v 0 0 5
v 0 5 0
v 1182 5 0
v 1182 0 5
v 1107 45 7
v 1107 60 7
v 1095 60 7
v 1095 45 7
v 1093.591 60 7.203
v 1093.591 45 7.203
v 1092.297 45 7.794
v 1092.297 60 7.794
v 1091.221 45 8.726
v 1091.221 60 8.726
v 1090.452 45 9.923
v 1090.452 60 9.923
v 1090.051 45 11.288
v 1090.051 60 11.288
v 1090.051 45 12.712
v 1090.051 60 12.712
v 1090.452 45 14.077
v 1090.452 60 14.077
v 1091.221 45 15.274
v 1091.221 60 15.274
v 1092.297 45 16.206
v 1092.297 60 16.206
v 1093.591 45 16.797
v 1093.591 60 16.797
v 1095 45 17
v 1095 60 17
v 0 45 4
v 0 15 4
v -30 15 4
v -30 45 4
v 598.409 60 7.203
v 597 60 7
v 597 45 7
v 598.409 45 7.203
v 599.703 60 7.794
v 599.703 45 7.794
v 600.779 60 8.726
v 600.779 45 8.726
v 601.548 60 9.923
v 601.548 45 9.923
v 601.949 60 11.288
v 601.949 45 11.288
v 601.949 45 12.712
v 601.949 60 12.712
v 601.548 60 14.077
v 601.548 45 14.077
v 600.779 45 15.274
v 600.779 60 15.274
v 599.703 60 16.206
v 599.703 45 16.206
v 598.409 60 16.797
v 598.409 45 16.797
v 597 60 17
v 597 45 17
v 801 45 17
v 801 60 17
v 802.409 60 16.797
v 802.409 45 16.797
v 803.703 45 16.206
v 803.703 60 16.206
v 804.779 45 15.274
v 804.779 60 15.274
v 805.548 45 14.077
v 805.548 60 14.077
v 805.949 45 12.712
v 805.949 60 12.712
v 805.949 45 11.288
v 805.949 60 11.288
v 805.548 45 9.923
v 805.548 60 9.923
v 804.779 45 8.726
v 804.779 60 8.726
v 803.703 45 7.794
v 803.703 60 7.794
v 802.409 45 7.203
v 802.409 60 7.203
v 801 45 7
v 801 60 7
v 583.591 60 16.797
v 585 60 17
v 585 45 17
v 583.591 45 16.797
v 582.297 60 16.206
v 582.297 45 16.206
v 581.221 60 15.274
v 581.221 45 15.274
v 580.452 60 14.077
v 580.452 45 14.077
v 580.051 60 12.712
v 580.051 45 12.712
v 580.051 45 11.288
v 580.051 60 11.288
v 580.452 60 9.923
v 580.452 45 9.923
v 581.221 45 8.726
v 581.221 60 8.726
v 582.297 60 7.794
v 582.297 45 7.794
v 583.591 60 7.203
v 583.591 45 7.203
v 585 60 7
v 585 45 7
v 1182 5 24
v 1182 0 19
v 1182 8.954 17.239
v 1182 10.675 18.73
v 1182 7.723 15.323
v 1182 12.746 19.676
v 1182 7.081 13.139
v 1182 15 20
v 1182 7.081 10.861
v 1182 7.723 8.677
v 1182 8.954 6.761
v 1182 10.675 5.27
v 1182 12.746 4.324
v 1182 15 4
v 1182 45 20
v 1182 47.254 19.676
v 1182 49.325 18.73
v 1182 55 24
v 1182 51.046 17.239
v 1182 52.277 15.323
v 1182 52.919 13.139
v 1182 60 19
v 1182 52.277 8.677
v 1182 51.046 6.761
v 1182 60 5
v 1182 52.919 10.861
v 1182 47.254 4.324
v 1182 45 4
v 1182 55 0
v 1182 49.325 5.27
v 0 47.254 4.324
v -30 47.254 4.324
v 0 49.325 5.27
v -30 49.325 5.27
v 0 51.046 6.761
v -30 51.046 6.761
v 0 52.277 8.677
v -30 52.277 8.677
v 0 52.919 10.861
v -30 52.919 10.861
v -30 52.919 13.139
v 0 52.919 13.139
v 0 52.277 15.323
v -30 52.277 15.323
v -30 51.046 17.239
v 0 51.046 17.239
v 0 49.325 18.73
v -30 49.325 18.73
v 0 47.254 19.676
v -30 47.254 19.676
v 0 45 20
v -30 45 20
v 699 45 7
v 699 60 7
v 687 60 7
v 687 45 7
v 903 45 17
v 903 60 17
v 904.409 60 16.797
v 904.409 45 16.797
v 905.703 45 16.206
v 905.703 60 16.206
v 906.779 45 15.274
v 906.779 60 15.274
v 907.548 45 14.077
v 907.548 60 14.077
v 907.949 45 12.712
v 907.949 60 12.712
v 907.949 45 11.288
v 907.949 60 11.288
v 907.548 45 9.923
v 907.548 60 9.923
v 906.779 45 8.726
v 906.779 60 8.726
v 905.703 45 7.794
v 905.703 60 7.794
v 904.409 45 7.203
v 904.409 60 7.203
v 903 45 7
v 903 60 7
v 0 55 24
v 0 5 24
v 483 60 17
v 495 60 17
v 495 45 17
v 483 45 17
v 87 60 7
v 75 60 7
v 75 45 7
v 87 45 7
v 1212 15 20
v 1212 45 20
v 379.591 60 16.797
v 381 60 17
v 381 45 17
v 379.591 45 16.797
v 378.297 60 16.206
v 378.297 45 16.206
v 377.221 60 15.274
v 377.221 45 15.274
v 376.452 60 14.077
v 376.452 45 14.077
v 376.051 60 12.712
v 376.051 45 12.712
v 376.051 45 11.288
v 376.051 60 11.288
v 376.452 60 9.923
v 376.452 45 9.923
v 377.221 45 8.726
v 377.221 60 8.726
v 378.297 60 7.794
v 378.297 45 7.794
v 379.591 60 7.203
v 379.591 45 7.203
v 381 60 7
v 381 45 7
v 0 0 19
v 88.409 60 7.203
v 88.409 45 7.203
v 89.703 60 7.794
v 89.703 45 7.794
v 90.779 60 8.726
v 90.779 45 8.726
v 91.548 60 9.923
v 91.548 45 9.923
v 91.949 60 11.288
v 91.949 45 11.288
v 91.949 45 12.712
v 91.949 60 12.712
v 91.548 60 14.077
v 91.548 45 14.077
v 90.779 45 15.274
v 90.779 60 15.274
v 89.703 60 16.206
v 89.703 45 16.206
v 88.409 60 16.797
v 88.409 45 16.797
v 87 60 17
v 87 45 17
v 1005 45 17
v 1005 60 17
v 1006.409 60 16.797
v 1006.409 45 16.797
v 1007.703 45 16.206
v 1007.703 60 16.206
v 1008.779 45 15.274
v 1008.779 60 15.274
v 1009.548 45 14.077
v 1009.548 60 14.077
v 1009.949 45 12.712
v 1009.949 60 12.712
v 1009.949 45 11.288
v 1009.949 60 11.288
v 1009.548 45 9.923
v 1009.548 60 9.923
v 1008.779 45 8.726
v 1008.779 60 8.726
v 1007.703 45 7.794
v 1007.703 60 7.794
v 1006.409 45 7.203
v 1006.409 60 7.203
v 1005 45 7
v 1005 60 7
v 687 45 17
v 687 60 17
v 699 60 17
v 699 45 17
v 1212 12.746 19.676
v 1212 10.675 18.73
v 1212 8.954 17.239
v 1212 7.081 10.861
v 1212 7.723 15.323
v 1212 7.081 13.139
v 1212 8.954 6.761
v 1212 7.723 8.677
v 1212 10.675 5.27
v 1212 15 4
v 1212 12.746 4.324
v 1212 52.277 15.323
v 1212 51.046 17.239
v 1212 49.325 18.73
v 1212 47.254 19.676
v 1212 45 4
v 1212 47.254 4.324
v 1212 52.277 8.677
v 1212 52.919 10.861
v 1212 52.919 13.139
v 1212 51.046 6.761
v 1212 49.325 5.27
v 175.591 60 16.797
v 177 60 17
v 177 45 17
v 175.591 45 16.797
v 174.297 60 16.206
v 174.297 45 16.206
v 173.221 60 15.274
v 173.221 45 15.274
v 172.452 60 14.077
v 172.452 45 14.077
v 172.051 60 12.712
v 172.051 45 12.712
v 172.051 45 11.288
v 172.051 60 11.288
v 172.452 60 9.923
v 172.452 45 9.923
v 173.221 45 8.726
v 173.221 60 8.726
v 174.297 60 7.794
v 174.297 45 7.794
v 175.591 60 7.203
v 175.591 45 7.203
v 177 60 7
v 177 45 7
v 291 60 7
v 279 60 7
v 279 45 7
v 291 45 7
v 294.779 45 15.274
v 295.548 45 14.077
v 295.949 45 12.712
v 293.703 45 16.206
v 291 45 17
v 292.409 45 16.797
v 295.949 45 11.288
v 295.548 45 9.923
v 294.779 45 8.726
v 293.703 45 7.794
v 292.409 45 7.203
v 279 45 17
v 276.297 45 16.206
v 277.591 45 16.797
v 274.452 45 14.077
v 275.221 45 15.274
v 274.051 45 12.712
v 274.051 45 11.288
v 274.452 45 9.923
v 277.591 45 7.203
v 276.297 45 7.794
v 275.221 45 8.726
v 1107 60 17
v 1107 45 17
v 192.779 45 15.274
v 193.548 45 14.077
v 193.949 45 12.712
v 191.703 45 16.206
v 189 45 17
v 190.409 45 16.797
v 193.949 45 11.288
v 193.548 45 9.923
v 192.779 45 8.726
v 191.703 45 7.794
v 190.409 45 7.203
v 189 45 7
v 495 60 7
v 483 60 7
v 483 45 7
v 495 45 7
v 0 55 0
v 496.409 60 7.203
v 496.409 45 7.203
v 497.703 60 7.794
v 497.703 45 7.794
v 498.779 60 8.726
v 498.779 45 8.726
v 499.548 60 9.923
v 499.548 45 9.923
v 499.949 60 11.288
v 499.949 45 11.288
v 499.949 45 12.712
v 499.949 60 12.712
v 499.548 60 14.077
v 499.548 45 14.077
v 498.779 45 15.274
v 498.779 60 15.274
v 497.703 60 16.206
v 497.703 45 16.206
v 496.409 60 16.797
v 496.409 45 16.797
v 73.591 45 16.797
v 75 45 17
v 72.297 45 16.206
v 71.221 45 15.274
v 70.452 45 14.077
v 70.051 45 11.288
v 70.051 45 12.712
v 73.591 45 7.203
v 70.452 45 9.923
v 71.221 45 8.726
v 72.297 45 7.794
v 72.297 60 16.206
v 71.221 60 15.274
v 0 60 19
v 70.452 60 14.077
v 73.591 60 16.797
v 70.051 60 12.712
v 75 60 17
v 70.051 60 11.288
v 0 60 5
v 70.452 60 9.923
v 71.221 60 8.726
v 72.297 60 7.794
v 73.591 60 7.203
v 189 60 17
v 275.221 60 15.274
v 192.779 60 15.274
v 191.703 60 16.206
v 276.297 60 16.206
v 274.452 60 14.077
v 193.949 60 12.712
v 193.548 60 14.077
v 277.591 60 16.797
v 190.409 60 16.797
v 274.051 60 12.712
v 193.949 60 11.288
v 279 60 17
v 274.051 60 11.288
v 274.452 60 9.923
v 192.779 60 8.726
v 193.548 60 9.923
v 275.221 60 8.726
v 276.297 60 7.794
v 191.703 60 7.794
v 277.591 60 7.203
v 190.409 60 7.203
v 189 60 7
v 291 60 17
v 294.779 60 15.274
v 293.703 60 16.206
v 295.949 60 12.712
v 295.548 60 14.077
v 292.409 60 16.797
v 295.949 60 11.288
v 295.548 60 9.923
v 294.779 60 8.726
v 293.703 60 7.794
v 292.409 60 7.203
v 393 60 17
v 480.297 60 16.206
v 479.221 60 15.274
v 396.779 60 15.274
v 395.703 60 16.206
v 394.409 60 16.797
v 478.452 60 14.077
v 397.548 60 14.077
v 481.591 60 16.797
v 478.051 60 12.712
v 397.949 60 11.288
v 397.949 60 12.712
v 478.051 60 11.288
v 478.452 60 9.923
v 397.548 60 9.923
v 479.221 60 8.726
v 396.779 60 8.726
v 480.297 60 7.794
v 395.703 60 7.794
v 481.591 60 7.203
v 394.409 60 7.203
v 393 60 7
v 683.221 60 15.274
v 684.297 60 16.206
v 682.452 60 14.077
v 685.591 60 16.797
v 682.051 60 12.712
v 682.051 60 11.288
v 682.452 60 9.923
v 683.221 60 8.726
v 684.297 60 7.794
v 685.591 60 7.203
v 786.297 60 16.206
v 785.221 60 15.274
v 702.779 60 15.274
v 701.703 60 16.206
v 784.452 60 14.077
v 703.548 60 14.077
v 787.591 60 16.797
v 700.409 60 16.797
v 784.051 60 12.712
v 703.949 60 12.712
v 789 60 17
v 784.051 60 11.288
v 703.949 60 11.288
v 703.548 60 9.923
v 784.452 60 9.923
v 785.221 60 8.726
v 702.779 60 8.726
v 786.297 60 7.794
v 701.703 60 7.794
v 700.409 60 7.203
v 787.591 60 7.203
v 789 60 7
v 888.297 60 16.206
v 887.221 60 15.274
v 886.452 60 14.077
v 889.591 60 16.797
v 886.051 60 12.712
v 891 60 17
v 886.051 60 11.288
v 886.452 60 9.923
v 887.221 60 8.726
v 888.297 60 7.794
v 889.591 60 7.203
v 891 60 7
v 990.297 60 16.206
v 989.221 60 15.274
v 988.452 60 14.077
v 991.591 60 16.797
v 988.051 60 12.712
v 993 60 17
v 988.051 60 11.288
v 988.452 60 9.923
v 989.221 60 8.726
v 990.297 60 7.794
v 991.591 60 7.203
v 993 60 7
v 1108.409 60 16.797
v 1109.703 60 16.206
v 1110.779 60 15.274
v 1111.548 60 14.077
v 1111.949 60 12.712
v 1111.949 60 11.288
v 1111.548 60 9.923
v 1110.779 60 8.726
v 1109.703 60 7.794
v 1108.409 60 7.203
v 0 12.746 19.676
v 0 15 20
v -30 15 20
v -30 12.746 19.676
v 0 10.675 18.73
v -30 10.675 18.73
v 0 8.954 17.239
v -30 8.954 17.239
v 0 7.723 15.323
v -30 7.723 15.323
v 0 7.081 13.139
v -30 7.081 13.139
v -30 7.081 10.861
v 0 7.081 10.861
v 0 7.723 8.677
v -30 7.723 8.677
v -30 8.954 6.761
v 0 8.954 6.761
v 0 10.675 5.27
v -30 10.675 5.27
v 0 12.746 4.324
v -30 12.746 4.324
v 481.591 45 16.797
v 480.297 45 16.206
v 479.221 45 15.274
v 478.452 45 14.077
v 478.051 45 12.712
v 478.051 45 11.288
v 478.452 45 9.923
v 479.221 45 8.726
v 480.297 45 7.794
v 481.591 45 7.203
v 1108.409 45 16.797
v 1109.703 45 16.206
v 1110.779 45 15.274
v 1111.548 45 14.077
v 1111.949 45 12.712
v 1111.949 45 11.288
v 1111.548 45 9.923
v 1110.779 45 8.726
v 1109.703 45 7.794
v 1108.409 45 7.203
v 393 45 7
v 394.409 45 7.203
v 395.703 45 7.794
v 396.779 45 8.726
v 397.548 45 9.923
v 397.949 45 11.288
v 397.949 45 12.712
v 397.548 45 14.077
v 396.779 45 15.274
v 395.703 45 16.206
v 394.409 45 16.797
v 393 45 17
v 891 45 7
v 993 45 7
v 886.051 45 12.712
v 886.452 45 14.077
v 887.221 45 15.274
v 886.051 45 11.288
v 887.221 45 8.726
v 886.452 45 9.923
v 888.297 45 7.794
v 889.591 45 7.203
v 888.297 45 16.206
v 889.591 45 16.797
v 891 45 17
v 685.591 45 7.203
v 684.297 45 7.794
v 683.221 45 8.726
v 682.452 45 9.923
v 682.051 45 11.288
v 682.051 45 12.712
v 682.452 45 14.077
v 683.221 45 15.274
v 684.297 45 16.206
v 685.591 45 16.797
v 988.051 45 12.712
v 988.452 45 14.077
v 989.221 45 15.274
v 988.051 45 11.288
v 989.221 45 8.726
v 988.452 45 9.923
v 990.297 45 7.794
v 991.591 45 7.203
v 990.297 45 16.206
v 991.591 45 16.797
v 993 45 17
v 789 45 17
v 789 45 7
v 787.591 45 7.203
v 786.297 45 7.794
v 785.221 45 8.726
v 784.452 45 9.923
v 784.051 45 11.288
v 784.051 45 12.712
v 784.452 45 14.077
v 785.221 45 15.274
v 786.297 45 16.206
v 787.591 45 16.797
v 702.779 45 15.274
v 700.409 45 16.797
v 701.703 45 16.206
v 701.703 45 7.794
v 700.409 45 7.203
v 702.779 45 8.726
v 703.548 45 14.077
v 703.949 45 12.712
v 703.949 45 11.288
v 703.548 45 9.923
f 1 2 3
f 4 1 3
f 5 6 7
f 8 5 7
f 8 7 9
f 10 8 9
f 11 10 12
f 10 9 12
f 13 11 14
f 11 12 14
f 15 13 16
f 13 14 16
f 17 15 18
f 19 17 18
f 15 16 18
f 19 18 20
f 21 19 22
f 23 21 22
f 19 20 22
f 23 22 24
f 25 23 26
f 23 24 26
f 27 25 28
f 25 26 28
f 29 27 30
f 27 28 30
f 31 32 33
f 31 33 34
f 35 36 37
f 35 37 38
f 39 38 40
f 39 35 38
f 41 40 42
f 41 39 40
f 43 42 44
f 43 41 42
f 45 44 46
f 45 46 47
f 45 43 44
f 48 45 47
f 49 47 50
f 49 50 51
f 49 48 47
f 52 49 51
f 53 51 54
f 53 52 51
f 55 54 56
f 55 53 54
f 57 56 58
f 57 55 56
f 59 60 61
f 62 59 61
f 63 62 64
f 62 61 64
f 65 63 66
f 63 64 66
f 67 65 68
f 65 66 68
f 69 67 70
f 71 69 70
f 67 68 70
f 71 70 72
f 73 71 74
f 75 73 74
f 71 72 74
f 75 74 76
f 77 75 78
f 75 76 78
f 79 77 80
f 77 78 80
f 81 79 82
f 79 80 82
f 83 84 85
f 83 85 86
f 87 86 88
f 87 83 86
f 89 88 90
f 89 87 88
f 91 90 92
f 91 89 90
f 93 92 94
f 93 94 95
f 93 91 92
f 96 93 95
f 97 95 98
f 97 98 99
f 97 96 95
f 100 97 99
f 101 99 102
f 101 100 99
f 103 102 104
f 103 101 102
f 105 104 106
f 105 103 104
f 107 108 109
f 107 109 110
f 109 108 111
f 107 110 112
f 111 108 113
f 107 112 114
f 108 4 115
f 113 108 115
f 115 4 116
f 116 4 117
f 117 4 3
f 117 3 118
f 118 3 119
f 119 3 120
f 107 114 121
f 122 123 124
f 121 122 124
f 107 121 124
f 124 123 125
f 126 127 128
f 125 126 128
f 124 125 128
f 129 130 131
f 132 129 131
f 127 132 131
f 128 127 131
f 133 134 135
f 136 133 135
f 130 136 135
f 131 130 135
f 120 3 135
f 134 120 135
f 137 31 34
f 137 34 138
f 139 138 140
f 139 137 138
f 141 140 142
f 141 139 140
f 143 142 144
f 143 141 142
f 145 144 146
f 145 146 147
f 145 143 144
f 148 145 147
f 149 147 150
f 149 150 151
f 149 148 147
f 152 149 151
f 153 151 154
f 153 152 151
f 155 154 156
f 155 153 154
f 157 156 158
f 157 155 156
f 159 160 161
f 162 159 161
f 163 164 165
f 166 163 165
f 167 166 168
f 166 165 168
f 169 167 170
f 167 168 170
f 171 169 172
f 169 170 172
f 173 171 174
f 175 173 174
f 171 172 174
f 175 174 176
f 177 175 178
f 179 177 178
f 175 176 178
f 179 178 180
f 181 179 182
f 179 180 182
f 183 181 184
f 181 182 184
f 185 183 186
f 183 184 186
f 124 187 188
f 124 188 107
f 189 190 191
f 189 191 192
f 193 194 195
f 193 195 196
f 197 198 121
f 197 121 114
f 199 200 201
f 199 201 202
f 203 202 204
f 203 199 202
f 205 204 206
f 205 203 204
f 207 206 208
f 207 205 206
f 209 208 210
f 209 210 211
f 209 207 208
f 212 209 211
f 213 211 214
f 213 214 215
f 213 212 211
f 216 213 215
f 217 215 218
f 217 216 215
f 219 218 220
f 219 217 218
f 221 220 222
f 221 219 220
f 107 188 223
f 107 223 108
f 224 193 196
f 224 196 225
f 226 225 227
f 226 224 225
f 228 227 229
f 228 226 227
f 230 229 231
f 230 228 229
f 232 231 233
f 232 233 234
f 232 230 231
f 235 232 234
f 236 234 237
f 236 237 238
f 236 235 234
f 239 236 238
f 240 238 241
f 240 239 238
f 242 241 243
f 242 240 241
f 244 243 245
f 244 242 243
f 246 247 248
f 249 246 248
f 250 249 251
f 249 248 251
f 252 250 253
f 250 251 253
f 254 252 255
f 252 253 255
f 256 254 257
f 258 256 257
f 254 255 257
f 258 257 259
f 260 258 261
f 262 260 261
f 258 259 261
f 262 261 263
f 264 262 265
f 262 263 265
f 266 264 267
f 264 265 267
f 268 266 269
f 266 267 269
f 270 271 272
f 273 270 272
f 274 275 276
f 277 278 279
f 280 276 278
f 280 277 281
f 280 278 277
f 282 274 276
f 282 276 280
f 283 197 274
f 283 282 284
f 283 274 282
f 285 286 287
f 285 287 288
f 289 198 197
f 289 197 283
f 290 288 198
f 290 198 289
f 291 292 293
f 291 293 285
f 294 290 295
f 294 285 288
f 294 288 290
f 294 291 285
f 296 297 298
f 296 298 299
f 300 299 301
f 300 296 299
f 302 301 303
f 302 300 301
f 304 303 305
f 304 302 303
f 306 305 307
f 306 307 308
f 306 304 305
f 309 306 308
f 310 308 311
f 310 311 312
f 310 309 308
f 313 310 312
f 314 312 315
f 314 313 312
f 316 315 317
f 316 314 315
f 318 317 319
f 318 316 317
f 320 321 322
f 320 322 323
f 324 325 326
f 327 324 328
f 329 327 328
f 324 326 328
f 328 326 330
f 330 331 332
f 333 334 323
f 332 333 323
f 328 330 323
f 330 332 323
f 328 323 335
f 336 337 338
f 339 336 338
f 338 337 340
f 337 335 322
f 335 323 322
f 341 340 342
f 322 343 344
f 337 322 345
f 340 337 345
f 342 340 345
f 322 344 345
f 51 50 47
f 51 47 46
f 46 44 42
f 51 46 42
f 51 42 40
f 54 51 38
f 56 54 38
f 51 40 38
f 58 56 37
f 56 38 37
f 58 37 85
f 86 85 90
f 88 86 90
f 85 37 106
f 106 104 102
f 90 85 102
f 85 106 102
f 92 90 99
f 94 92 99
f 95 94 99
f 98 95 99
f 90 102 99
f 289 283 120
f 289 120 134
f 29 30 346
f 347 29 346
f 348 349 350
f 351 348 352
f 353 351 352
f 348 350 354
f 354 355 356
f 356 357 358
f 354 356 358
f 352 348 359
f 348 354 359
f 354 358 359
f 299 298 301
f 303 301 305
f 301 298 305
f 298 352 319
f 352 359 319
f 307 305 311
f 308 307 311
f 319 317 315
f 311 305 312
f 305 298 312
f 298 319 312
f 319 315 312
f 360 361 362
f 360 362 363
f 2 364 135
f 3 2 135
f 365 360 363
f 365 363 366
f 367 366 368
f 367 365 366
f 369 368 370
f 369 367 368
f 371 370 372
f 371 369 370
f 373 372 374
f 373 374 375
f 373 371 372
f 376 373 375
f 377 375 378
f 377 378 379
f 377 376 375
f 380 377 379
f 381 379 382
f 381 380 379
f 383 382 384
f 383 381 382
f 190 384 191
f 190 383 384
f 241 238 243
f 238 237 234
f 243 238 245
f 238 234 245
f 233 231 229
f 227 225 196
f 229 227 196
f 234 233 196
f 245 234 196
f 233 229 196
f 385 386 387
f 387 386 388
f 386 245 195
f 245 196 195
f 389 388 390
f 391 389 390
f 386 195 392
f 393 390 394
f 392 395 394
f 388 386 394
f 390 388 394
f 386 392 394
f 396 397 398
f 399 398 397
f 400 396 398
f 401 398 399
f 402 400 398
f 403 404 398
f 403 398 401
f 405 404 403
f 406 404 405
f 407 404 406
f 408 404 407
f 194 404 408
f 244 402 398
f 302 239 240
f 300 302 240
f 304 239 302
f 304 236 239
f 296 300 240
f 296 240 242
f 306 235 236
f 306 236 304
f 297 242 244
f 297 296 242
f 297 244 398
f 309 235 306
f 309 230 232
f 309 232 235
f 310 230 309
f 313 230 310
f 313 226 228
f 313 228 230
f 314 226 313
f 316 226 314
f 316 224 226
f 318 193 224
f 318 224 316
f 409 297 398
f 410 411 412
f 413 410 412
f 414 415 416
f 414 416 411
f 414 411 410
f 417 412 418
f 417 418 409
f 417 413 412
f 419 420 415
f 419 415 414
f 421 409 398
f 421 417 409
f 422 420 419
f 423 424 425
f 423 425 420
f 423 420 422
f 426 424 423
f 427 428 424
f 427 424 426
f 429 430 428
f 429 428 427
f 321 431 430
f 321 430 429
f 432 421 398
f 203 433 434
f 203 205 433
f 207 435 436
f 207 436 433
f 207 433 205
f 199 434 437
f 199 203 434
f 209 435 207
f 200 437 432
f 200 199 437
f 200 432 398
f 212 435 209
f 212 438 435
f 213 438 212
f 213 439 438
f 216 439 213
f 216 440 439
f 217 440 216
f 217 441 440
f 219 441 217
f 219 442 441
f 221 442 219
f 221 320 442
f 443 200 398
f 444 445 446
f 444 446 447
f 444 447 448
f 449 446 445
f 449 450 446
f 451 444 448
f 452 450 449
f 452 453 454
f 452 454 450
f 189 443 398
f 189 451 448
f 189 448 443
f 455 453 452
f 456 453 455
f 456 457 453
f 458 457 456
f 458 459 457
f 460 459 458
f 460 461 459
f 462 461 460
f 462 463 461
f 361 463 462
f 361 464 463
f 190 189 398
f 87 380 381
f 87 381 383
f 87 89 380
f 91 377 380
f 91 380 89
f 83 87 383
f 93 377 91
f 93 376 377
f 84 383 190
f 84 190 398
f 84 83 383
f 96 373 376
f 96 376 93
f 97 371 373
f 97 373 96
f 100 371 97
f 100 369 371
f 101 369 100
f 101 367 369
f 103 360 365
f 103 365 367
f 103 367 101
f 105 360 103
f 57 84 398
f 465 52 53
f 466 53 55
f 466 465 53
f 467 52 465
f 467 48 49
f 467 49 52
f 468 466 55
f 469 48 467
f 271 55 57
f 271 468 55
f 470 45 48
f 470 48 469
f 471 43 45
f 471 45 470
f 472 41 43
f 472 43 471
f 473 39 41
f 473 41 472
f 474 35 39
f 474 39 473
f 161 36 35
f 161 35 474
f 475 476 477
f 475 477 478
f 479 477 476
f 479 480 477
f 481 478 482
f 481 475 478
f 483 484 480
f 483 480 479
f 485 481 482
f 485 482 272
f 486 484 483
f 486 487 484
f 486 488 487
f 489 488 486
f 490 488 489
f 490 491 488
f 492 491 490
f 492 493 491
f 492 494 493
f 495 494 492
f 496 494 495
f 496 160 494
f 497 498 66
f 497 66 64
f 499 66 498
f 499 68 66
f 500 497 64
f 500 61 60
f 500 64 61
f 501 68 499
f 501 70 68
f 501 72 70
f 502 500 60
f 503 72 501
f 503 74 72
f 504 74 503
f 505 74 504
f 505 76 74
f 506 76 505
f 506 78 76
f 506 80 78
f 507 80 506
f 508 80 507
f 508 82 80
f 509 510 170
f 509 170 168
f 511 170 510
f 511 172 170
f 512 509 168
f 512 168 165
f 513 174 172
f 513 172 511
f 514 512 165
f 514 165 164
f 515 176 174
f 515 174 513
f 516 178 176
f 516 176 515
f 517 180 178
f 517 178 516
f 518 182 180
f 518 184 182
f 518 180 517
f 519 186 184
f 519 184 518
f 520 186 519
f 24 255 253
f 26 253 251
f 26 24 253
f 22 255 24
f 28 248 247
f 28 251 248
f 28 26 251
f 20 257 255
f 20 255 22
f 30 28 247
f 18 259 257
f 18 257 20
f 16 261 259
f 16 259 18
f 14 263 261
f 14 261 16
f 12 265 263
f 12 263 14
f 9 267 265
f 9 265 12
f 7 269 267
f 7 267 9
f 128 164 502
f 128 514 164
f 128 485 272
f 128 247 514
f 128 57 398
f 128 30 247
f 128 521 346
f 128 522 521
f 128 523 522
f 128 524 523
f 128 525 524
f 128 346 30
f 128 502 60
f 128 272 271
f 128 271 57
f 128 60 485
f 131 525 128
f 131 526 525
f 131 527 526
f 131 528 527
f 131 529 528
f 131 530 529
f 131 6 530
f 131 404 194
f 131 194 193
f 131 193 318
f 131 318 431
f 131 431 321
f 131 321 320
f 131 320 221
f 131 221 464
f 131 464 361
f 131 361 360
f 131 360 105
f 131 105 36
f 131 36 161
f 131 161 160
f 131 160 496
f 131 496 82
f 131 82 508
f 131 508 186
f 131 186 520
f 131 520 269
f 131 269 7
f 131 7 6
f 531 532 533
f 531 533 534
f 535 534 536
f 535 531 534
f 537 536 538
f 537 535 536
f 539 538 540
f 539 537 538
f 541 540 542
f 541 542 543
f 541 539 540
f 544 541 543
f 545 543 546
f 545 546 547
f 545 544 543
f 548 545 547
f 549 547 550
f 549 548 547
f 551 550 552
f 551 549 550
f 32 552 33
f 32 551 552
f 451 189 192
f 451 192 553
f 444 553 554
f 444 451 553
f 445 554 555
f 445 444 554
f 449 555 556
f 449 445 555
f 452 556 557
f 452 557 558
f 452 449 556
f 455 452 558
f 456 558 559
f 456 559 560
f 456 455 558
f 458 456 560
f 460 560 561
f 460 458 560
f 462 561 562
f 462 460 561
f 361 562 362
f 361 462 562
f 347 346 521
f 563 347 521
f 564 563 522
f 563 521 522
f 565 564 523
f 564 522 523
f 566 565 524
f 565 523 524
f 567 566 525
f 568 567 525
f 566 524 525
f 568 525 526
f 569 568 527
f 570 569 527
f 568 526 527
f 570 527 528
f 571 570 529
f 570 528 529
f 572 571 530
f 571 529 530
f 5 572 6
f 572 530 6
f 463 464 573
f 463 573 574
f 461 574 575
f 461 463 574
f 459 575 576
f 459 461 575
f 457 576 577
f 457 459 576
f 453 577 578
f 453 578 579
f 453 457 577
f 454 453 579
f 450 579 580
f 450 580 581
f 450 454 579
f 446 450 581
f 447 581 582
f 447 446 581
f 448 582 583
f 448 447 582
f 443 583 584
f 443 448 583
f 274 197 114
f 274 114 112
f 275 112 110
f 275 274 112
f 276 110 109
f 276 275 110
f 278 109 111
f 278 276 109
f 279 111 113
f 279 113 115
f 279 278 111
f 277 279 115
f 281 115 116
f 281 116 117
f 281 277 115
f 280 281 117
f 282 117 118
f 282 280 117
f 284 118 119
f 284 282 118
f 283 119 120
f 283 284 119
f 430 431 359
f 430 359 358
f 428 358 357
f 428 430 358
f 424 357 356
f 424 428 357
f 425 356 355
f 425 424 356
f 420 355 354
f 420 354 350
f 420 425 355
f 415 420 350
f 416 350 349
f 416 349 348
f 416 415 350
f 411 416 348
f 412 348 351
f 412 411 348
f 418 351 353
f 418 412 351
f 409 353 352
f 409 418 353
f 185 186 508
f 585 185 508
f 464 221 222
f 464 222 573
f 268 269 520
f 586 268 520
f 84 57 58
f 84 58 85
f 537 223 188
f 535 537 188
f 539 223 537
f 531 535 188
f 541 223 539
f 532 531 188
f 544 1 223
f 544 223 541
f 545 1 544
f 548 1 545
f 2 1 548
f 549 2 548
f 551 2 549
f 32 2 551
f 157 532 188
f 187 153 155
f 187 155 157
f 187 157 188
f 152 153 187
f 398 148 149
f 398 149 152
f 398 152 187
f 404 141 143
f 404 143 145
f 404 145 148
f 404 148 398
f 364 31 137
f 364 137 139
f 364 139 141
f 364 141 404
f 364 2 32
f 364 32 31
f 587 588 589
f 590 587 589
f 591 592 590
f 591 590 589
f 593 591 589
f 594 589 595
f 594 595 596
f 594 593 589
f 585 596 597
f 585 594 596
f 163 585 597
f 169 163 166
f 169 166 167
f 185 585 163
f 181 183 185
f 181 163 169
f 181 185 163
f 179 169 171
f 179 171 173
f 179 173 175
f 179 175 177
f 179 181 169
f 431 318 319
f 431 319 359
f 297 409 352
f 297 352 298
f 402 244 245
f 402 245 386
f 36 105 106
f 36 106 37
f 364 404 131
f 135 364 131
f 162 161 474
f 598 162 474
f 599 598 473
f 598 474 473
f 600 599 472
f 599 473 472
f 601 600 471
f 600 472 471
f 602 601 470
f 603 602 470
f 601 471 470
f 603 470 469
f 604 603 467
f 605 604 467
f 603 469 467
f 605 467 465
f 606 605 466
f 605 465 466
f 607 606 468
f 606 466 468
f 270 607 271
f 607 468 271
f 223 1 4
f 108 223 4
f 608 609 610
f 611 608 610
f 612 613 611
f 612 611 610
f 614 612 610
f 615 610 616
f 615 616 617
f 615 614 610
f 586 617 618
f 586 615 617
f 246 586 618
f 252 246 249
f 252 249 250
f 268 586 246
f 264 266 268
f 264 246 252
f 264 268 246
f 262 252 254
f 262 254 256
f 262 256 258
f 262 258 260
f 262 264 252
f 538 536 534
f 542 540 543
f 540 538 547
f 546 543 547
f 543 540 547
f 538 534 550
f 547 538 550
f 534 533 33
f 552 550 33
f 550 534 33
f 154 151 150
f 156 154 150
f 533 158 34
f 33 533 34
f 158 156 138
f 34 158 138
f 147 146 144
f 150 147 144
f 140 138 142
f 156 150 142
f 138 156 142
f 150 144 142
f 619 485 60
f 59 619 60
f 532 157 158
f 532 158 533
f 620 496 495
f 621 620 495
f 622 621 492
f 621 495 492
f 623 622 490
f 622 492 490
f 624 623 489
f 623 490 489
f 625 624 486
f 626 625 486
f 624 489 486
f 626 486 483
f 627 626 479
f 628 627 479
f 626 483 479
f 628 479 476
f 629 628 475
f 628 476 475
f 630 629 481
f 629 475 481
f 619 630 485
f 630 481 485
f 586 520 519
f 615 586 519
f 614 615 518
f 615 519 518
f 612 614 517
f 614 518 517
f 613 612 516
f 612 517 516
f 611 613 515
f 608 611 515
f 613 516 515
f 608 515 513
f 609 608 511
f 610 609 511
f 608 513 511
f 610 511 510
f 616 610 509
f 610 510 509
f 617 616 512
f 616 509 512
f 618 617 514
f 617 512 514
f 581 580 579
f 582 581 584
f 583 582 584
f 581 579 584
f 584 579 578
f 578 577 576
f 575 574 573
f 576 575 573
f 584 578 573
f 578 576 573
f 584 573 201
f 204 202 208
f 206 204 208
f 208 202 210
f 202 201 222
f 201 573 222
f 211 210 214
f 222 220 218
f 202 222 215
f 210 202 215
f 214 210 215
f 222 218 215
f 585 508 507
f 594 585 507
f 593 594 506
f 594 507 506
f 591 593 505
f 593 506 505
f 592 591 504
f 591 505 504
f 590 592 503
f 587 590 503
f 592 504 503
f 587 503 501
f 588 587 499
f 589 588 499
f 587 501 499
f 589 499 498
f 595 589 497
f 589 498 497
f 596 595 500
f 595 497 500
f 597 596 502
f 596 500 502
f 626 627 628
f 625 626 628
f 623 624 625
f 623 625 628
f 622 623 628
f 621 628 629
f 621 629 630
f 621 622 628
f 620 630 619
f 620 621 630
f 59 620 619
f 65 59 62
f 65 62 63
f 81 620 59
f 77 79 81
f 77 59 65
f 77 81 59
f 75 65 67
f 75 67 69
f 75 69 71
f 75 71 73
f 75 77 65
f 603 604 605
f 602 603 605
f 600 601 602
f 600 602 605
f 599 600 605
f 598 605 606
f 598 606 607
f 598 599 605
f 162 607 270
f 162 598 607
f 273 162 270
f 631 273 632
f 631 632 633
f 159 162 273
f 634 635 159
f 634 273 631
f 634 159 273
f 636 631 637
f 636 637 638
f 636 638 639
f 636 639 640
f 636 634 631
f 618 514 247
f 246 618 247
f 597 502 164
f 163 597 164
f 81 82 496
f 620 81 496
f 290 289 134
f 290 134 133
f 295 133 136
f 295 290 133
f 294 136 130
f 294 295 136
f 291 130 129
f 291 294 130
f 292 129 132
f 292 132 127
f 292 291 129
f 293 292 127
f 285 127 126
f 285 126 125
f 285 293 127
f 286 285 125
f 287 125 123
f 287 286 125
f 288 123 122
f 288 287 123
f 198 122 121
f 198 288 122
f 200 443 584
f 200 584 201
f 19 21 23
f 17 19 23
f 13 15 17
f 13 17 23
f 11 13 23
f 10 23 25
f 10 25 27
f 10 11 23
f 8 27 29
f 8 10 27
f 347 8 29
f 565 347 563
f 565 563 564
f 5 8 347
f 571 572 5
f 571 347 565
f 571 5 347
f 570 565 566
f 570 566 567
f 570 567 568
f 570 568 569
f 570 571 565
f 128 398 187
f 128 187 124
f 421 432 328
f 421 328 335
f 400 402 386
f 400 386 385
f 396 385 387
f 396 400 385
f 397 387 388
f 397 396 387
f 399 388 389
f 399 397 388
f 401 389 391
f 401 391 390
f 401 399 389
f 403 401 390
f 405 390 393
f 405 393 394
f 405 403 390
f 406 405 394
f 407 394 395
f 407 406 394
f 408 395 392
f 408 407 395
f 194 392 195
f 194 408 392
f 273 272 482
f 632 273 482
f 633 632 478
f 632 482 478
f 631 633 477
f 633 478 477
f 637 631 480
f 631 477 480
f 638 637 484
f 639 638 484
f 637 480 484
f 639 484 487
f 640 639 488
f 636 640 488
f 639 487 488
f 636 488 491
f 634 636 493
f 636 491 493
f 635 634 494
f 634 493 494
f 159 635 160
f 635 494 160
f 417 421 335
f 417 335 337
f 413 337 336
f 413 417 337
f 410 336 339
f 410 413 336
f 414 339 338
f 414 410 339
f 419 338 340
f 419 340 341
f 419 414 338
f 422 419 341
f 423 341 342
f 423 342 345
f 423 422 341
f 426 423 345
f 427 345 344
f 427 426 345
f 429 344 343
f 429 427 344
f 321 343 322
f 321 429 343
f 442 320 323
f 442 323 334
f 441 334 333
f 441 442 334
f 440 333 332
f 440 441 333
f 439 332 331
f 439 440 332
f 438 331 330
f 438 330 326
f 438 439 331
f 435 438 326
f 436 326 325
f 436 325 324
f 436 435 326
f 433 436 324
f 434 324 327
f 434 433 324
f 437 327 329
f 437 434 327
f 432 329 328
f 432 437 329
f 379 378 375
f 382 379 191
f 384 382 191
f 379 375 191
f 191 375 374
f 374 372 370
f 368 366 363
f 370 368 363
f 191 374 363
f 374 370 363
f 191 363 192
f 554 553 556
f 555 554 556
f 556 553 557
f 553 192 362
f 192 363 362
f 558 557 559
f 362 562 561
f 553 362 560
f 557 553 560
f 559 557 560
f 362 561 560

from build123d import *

# Parameters (mm, degrees)
ESQUISSE1_W             = 1182
ESQUISSE1_H             = 60
BOSS_EXTRU_1_DEPTH      = 24
BOSS_EXTRU_2_DEPTH      = 30
BOSS_EXTRU_3_START      = -1212
BOSS_EXTRU_3_DEPTH      = 30
CHANFREIN1_SIZE         = 5
ENL_V_MAT_EXTRU_1_DEPTH = 15


with BuildPart() as part:
    # Esquisse1 → Boss.-Extru.1 (new body)
    with BuildSketch(Plane.XY):
        with Locations((591, 30)):
            Rectangle(ESQUISSE1_W, ESQUISSE1_H)
    extrude(amount=BOSS_EXTRU_1_DEPTH)

    # Esquisse2 → Boss.-Extru.2 (add)
    with BuildSketch(Plane.ZY):
        with BuildLine():
            Line((4, 15), (4, 45))
            ThreePointArc((4, 45), (12, 53), (20, 45))
            Line((20, 45), (20, 15))
            ThreePointArc((20, 15), (12, 7), (4, 15))
        make_face()
    extrude(amount=BOSS_EXTRU_2_DEPTH)

    # Esquisse2<2> → Boss.-Extru.3 (add)
    with BuildSketch(Plane.ZY.offset(BOSS_EXTRU_3_START)):
        with BuildLine():
            Line((4, 15), (4, 45))
            ThreePointArc((4, 45), (12, 53), (20, 45))
            Line((20, 45), (20, 15))
            ThreePointArc((20, 15), (12, 7), (4, 15))
        make_face()
    extrude(amount=BOSS_EXTRU_3_DEPTH)

    # Chanfrein1
    chanfrein1_edges = [part.edges().sort_by_distance(p)[0] for p in [
        (591, 60, 24),
        (591, 60, 0),
        (591, 0, 0),
        (591, 0, 24),
    ]]
    chamfer(chanfrein1_edges, length=CHANFREIN1_SIZE)

    # Esquisse3 → Enlèv. mat.-Extru.1 (cut)
    with BuildSketch(Plane(origin=(0, 60, 0), x_dir=(1, 0, 0), z_dir=(0, 1, 0))):
        with BuildLine():
            Line((483, -7), (495, -7))
            ThreePointArc((495, -7), (500, -12), (495, -17))
            Line((495, -17), (483, -17))
            ThreePointArc((483, -17), (478, -12), (483, -7))
        make_face()
        with BuildLine():
            Line((381, -7), (393, -7))
            ThreePointArc((393, -7), (398, -12), (393, -17))
            Line((393, -17), (381, -17))
            ThreePointArc((381, -17), (376, -12), (381, -7))
        make_face()
        with BuildLine():
            Line((279, -7), (291, -7))
            ThreePointArc((291, -7), (296, -12), (291, -17))
            Line((291, -17), (279, -17))
            ThreePointArc((279, -17), (274, -12), (279, -7))
        make_face()
        with BuildLine():
            Line((177, -7), (189, -7))
            ThreePointArc((189, -7), (194, -12), (189, -17))
            Line((189, -17), (177, -17))
            ThreePointArc((177, -17), (172, -12), (177, -7))
        make_face()
        with BuildLine():
            Line((75, -7), (87, -7))
            ThreePointArc((87, -7), (92, -12), (87, -17))
            Line((87, -17), (75, -17))
            ThreePointArc((75, -17), (70, -12), (75, -7))
        make_face()
        with BuildLine():
            Line((585, -7), (597, -7))
            ThreePointArc((597, -7), (602, -12), (597, -17))
            Line((597, -17), (585, -17))
            ThreePointArc((585, -17), (580, -12), (585, -7))
        make_face()
        with BuildLine():
            Line((1107, -7), (1095, -7))
            ThreePointArc((1095, -7), (1090, -12), (1095, -17))
            Line((1095, -17), (1107, -17))
            ThreePointArc((1107, -17), (1112, -12), (1107, -7))
        make_face()
        with BuildLine():
            Line((1005, -7), (993, -7))
            ThreePointArc((993, -7), (988, -12), (993, -17))
            Line((993, -17), (1005, -17))
            ThreePointArc((1005, -17), (1010, -12), (1005, -7))
        make_face()
        with BuildLine():
            Line((903, -7), (891, -7))
            ThreePointArc((891, -7), (886, -12), (891, -17))
            Line((891, -17), (903, -17))
            ThreePointArc((903, -17), (908, -12), (903, -7))
        make_face()
        with BuildLine():
            Line((801, -7), (789, -7))
            ThreePointArc((789, -7), (784, -12), (789, -17))
            Line((789, -17), (801, -17))
            ThreePointArc((801, -17), (806, -12), (801, -7))
        make_face()
        with BuildLine():
            Line((699, -7), (687, -7))
            ThreePointArc((687, -7), (682, -12), (687, -17))
            Line((687, -17), (699, -17))
            ThreePointArc((699, -17), (704, -12), (699, -7))
        make_face()
    extrude(amount=-ENL_V_MAT_EXTRU_1_DEPTH, mode=Mode.SUBTRACT)


solid = part.part
